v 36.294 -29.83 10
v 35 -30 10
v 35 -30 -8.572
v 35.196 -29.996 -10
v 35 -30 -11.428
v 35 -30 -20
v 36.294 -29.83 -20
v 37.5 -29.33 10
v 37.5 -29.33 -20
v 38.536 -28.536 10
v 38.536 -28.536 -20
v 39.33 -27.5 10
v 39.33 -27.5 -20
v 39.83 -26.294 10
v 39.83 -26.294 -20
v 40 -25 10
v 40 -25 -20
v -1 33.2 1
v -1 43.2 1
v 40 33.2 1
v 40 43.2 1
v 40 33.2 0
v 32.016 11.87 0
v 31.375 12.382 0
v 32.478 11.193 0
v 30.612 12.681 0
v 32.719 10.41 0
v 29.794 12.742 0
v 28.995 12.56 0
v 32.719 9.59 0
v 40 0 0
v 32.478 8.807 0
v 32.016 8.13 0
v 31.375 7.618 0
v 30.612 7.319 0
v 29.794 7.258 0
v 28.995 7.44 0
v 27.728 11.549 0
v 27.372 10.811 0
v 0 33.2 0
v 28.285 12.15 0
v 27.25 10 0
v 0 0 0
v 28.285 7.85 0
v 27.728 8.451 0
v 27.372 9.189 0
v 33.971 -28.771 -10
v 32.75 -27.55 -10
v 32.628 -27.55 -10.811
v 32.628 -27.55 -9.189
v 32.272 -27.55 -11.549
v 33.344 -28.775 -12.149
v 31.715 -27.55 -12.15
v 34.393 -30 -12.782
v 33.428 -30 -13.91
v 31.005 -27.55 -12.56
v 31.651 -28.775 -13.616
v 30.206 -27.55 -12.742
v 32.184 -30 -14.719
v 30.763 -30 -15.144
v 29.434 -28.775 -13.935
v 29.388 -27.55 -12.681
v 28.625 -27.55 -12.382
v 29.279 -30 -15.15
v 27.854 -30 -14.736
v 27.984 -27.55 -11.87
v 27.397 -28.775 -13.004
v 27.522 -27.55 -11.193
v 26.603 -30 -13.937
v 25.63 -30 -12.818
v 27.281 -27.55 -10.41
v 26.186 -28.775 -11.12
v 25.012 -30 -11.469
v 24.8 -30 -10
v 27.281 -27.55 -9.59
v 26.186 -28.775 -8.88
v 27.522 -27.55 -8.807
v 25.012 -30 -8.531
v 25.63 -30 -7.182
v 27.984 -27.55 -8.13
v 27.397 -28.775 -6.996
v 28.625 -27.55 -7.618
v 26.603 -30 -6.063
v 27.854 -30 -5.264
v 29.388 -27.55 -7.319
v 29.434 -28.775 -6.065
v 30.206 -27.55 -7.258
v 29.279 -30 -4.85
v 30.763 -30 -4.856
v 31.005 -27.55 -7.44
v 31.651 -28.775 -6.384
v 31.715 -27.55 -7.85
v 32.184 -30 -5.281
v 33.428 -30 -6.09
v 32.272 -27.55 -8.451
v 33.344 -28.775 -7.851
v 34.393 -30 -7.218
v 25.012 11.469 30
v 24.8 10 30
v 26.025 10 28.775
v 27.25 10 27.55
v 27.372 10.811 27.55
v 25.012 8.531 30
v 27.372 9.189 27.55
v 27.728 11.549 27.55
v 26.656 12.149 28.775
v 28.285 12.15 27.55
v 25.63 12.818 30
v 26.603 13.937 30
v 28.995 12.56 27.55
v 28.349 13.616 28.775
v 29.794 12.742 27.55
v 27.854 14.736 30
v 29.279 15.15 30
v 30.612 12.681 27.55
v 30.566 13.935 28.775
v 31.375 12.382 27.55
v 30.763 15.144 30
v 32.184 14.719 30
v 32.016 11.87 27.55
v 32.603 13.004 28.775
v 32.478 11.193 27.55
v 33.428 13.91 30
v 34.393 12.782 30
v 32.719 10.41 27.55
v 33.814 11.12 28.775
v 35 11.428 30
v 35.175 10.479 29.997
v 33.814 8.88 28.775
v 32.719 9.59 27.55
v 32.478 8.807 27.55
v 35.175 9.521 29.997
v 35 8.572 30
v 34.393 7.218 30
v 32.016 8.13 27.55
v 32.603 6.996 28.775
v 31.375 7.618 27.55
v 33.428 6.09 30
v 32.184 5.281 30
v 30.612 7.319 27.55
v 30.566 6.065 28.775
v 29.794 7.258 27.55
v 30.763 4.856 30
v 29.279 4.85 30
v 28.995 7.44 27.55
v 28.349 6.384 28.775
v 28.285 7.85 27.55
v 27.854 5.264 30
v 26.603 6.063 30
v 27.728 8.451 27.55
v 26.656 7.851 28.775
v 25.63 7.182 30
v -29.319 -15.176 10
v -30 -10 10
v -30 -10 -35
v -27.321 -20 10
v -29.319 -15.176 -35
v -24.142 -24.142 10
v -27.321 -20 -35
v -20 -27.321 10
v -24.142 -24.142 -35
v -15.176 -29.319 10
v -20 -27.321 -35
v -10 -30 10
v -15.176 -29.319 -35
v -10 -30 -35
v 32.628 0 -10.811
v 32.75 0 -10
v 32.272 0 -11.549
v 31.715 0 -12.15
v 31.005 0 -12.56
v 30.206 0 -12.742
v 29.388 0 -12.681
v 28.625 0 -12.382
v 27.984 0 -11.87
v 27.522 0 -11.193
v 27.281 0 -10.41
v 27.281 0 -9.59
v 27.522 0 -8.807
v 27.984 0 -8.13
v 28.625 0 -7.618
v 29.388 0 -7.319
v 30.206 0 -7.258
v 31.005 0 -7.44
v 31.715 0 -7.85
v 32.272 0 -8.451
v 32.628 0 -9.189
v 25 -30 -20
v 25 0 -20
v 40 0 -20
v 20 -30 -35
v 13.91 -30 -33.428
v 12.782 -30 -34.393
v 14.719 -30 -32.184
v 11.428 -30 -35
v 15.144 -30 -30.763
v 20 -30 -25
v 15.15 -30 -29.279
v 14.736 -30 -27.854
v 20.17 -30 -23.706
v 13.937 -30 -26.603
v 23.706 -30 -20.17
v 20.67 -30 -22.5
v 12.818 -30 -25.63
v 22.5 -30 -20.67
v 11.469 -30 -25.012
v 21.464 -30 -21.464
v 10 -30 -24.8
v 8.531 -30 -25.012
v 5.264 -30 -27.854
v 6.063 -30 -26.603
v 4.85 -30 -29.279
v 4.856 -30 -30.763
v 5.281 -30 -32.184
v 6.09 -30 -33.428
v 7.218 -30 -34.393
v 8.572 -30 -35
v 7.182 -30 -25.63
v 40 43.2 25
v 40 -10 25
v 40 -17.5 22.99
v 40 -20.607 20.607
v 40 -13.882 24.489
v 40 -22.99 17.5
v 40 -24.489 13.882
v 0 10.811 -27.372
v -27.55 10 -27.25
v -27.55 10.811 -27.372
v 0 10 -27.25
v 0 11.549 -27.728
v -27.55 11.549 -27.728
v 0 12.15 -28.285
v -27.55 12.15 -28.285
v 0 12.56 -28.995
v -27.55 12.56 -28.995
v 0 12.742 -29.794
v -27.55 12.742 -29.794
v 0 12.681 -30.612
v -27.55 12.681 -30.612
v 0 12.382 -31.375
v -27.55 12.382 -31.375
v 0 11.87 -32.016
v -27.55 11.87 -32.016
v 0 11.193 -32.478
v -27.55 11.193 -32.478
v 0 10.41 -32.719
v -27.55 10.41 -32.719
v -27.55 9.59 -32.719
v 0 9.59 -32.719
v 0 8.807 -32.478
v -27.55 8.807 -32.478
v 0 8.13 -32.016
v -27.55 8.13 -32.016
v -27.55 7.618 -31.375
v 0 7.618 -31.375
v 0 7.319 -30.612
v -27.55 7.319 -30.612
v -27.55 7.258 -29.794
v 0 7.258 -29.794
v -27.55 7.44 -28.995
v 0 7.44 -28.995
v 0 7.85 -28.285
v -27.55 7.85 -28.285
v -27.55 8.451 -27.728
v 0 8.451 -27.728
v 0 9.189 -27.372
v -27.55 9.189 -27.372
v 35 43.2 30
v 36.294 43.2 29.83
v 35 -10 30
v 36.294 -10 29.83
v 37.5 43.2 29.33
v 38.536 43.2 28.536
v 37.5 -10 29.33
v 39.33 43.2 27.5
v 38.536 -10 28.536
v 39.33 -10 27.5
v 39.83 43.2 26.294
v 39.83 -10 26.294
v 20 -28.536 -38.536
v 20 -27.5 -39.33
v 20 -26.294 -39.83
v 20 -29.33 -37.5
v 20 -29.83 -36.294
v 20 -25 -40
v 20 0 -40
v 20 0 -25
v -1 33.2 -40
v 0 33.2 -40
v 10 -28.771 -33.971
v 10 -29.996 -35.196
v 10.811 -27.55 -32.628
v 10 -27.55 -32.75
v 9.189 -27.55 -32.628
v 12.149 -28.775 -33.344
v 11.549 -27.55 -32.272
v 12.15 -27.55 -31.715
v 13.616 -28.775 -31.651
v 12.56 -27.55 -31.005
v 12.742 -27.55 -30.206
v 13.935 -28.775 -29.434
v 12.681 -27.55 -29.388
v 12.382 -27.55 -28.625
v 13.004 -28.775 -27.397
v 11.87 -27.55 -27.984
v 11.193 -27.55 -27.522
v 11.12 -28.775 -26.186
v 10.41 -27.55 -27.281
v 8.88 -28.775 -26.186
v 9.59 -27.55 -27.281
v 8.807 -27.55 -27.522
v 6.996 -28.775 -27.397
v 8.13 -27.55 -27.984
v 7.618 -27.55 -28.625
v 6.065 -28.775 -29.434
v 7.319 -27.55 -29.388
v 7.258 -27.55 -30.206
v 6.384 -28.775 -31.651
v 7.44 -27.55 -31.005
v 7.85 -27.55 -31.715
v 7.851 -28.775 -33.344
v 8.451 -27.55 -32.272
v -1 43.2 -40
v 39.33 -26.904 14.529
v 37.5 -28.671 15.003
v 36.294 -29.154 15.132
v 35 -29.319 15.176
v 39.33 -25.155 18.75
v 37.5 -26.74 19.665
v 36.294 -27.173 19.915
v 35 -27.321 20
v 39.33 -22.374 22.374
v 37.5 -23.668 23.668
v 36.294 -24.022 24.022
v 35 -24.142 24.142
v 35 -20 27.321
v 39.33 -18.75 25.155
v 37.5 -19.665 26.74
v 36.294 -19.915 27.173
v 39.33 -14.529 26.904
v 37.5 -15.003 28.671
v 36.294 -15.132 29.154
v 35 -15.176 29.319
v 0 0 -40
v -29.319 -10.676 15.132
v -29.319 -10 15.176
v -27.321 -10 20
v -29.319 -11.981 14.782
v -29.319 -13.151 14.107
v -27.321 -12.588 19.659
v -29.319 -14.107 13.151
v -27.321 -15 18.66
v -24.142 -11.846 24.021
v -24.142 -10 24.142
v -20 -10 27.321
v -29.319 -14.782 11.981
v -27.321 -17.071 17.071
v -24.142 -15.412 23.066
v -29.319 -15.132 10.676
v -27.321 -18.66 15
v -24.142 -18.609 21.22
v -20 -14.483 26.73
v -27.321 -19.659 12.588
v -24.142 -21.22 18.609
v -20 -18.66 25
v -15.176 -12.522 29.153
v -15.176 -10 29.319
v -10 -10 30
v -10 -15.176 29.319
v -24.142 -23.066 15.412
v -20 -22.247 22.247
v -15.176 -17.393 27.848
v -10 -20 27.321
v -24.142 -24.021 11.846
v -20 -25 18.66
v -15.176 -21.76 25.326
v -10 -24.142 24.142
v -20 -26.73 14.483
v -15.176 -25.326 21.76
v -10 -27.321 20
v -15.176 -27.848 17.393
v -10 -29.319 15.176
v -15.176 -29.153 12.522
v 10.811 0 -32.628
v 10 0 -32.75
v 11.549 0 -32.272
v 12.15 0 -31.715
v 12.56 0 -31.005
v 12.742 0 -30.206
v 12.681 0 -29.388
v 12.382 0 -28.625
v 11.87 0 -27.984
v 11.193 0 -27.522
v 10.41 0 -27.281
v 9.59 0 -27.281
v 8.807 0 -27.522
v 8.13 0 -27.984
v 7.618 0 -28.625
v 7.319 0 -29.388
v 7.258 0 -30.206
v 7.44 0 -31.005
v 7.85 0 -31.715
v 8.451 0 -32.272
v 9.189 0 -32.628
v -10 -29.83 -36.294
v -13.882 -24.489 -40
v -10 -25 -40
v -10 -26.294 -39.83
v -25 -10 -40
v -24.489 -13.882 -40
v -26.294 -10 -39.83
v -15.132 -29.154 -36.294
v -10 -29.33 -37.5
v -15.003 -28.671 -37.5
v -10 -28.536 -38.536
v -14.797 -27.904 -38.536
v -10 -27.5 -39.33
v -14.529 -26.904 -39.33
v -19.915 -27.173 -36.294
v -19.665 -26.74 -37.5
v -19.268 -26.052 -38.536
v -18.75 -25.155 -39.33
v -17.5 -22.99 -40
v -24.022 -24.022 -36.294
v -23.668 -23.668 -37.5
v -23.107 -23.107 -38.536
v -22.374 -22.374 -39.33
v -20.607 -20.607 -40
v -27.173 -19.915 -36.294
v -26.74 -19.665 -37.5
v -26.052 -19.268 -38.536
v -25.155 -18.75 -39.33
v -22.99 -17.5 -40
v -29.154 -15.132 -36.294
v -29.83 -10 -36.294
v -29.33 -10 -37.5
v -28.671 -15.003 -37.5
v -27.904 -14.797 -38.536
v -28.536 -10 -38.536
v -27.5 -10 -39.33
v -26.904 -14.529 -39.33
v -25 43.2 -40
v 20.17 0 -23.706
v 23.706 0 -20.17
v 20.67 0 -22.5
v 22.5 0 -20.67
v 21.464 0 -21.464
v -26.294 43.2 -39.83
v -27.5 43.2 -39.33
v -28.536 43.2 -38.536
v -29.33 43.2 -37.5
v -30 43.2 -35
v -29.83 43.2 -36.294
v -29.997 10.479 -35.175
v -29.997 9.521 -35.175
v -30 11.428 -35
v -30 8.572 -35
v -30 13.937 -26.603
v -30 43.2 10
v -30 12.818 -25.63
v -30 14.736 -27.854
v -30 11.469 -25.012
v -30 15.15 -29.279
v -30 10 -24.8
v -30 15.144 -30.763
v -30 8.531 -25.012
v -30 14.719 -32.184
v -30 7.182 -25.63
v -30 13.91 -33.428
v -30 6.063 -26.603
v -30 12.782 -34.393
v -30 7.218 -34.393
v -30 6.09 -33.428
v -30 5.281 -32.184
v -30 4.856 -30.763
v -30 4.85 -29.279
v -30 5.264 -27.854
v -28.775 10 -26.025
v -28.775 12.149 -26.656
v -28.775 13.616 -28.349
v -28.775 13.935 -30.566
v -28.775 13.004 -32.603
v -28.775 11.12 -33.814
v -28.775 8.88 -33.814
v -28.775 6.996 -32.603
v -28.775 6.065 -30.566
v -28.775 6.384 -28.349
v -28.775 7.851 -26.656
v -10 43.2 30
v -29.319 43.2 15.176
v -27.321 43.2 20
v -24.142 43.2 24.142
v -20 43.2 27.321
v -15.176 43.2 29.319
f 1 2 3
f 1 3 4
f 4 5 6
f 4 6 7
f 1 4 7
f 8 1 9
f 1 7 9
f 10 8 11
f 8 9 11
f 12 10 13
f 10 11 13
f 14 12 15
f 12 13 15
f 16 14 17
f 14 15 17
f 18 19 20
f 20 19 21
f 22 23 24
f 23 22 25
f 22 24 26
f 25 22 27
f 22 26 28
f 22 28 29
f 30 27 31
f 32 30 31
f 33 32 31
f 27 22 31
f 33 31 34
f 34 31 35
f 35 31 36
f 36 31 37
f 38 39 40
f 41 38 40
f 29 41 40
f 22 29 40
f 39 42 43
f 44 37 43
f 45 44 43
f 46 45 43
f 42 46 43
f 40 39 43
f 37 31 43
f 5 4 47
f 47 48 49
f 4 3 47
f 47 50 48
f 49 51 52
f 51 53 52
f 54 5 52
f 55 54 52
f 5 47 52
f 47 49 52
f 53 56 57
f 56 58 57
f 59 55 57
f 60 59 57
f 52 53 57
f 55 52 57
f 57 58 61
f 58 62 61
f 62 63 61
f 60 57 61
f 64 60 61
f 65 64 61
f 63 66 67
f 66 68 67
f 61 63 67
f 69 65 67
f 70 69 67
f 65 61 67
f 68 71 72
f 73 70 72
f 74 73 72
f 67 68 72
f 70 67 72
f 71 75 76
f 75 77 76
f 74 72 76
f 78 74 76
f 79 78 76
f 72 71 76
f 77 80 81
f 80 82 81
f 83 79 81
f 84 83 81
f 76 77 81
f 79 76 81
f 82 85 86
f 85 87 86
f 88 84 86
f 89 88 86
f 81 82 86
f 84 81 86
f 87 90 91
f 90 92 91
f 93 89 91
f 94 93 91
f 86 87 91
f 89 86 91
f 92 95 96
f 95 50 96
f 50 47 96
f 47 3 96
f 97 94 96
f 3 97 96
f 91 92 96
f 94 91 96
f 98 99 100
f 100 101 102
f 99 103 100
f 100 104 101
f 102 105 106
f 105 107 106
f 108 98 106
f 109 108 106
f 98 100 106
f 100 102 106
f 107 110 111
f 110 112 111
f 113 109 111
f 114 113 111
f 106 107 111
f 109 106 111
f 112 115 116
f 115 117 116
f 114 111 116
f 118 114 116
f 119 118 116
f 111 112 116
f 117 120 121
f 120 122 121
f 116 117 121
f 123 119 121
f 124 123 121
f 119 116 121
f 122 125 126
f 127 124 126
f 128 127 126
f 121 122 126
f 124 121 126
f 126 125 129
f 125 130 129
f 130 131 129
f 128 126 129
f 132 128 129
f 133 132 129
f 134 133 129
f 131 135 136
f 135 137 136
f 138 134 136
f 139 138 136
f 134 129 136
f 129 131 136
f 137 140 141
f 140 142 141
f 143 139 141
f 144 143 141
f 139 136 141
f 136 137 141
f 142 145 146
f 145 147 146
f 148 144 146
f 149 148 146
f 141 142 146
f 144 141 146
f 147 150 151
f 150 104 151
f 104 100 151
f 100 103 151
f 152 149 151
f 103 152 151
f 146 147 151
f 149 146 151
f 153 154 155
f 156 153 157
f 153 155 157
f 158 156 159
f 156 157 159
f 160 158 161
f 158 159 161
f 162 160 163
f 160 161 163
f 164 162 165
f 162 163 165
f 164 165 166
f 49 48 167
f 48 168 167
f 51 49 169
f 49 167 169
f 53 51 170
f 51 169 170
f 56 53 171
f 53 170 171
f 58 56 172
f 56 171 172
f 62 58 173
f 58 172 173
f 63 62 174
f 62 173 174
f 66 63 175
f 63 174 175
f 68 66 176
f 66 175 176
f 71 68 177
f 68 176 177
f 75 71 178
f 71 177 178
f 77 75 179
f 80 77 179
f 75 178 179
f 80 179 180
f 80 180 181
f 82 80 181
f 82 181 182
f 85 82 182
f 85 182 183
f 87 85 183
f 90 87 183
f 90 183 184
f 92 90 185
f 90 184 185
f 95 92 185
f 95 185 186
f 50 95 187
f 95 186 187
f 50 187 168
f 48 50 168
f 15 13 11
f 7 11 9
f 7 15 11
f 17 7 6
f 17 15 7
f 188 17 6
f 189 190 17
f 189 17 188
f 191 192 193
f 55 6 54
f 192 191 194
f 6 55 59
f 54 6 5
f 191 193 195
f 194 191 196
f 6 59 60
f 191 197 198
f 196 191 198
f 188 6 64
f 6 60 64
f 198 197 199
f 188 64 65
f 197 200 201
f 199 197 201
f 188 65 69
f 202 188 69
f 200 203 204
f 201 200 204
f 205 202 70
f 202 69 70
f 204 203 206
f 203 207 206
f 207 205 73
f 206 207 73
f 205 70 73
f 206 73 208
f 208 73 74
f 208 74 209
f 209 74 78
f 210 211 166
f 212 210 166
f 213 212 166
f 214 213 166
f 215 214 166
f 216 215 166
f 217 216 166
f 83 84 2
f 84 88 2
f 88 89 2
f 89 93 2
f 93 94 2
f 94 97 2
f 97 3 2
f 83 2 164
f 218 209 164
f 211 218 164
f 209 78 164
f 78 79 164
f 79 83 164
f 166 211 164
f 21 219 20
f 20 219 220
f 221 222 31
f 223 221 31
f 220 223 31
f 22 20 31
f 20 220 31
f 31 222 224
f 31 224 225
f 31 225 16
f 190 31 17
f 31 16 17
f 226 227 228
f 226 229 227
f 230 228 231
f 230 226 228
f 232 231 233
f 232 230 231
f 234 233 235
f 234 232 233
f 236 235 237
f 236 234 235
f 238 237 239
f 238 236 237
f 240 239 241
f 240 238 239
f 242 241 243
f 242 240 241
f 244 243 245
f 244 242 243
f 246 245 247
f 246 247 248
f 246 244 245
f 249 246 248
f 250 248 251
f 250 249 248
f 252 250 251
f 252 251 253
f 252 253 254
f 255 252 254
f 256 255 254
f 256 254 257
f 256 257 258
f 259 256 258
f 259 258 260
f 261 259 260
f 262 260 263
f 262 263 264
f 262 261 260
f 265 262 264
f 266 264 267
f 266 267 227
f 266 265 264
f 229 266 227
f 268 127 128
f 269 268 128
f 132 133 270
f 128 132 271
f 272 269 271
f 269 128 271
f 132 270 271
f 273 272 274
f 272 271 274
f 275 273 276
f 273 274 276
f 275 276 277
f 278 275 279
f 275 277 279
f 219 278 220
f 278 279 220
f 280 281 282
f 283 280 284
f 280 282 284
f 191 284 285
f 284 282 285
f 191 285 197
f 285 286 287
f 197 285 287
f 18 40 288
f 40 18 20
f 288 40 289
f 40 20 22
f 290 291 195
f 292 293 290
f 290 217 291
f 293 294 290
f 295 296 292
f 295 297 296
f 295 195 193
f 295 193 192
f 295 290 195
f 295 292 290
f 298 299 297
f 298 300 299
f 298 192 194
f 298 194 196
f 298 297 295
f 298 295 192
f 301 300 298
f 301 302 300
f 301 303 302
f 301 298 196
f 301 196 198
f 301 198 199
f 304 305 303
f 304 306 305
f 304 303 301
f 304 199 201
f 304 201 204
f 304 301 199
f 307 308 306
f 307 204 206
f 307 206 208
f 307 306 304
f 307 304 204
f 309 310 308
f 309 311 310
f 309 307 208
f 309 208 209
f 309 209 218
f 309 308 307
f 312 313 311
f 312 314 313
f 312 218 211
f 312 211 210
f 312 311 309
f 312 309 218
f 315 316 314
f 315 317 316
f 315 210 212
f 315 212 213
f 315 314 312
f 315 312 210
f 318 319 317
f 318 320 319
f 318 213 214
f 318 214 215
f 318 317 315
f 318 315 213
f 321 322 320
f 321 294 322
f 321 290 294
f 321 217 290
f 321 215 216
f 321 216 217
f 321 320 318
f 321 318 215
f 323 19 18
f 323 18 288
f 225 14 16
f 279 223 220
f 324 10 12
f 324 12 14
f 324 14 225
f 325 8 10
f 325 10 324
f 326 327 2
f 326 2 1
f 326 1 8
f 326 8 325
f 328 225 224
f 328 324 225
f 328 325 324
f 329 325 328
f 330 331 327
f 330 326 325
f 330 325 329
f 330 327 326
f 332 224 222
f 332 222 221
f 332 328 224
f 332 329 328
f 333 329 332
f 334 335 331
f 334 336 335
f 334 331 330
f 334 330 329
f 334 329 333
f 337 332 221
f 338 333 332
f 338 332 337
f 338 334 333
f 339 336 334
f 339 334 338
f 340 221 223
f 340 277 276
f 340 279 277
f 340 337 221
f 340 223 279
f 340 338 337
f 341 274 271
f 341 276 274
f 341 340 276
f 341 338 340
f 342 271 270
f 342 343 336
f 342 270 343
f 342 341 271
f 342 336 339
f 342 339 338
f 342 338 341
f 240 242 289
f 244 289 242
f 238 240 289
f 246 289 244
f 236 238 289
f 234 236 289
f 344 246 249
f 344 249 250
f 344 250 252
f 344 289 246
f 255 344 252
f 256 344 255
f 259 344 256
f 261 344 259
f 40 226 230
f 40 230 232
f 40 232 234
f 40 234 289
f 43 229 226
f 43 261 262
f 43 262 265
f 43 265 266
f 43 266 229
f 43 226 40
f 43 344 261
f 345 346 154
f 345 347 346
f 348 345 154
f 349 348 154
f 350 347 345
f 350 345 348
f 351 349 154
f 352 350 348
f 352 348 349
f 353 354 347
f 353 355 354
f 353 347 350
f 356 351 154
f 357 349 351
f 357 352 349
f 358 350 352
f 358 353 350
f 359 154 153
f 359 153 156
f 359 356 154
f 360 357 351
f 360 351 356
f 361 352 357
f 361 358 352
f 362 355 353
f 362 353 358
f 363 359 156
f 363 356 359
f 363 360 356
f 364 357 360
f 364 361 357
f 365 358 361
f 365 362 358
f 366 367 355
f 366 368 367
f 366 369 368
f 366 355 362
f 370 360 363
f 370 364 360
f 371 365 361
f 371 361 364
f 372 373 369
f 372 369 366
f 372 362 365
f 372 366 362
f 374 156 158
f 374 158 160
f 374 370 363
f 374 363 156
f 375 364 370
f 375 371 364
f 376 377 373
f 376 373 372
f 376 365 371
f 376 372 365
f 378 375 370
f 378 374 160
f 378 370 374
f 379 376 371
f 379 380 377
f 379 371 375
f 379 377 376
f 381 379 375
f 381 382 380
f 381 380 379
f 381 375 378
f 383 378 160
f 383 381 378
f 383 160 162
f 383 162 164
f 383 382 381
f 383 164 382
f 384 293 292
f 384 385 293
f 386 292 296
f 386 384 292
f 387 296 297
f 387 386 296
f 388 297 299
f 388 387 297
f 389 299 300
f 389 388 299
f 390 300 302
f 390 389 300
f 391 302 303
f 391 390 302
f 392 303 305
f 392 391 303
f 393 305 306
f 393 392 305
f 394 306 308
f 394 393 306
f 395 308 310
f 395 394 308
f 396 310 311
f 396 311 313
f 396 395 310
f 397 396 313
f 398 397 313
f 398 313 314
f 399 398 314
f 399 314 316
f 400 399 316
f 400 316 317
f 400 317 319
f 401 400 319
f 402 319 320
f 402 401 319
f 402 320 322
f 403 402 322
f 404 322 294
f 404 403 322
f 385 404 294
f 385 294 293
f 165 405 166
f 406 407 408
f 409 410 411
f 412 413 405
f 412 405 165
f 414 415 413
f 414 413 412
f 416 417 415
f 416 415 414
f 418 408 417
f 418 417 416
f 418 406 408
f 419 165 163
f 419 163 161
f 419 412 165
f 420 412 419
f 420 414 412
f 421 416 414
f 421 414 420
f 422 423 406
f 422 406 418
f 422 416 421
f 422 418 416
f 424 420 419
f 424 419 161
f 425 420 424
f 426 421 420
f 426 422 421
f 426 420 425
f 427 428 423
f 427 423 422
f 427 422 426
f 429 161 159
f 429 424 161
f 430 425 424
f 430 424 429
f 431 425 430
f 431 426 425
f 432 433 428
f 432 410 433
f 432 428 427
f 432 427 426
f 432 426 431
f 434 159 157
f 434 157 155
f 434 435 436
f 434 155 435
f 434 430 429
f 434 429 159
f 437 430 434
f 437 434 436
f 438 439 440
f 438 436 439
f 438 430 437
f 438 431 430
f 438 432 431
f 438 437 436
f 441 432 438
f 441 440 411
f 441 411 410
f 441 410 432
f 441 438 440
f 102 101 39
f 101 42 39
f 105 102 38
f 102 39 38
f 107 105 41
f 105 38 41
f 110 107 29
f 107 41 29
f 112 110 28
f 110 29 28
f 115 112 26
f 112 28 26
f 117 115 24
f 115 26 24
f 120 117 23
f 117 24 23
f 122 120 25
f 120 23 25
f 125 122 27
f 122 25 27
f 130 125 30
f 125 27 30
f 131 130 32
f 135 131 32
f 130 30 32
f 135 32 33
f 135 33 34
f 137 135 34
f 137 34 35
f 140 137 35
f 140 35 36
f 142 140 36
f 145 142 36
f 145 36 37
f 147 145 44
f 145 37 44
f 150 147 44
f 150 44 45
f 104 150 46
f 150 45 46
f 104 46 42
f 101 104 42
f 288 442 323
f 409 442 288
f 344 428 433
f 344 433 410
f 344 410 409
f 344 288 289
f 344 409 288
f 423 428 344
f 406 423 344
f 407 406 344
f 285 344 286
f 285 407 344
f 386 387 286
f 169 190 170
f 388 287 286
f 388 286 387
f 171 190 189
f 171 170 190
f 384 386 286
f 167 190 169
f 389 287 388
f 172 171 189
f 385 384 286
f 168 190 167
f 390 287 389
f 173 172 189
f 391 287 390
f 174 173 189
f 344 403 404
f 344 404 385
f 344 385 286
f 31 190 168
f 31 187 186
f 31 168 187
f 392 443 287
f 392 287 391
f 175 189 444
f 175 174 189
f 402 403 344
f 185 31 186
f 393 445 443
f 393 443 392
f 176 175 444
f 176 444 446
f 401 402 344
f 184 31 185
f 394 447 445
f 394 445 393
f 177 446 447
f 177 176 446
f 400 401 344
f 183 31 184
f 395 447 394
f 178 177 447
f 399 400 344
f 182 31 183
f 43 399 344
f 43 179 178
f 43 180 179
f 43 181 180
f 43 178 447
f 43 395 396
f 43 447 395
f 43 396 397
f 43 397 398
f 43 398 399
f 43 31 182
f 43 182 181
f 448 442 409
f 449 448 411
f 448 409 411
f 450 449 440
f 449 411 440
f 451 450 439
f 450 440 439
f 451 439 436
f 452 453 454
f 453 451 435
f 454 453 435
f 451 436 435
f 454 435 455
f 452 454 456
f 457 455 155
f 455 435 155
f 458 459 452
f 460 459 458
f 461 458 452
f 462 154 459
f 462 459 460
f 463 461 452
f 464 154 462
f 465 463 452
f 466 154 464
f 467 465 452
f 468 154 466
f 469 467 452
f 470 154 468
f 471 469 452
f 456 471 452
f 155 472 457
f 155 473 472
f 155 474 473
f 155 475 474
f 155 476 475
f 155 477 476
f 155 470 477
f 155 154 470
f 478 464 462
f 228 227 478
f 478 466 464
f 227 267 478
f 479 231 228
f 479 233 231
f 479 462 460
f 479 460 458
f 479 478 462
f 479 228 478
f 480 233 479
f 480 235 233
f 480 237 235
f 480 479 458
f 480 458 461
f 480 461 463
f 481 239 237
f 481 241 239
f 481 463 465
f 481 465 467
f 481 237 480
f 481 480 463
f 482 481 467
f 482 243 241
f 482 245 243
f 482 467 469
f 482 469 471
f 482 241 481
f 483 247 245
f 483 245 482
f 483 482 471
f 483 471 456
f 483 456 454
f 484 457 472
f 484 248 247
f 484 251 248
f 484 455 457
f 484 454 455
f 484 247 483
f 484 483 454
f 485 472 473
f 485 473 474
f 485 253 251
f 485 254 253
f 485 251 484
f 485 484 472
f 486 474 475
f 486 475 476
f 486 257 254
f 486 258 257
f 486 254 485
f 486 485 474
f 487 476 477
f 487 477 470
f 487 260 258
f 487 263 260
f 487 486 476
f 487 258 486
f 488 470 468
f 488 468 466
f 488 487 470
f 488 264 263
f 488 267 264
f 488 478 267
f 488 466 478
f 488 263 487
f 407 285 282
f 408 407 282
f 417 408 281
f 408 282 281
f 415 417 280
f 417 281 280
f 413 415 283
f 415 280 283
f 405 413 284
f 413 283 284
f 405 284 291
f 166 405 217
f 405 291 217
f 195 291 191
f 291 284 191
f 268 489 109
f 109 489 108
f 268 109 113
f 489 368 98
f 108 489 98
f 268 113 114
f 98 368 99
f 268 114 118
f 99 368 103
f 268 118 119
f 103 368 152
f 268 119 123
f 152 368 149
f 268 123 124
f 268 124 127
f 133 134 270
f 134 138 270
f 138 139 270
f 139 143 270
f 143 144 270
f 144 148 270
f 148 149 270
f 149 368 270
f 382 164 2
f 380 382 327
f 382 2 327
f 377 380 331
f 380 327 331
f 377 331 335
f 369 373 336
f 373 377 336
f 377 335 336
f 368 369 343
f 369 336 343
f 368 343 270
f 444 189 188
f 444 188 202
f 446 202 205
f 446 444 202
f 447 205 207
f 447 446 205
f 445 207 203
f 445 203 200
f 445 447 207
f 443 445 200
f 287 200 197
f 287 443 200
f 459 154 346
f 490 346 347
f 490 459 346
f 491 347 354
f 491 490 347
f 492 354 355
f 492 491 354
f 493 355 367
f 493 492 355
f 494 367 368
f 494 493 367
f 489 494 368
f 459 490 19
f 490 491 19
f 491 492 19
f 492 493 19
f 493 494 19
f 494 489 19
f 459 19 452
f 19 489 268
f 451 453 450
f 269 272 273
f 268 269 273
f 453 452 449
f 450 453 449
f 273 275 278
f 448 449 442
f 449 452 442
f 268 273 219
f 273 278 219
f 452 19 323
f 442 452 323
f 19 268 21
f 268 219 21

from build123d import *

# Parameters (mm, degrees)
BOSS_EXTRUDE1_DEPTH                             = 30
BOSS_EXTRUDE2_DEPTH                             = 43.2
CSK_FOR_M5_FLAT_HEAD_MACHINE_SCREW1_D           = 5.5
CSK_FOR_M5_FLAT_HEAD_MACHINE_SCREW1_CSINK_D     = 10.4
CSK_FOR_M5_FLAT_HEAD_MACHINE_SCREW1_CSINK_ANGLE = 90
CSK_FOR_M5_FLAT_HEAD_MACHINE_SCREW2_D           = 5.5
CSK_FOR_M5_FLAT_HEAD_MACHINE_SCREW2_CSINK_D     = 10.4
CSK_FOR_M5_FLAT_HEAD_MACHINE_SCREW2_CSINK_ANGLE = 90
CUT_EXTRUDE1_DEPTH                              = 10
FILLET3_R                                       = 20
FILLET4_R                                       = 5


with BuildPart() as part:
    # Sketch1 → Boss-Extrude1 (new body)
    with BuildSketch(Plane(origin=(0, 0, 0), x_dir=(1, 0, 0), z_dir=(0, 1, 0))):
        Polygon((20, 20), (0, 0), (40, 0), (40, 20), align=None)
        Polygon((40, 0), (0, 0), (-30, -30), (40, -30), align=None)
    extrude(amount=-BOSS_EXTRUDE1_DEPTH)

    # Sketch1<3> → Boss-Extrude2 (add)
    with BuildSketch(Plane(origin=(0, 0, 0), x_dir=(1, 0, 0), z_dir=(0, 1, 0))):
        Polygon((40, 0), (0, 0), (-30, -30), (40, -30), align=None)
    extrude(amount=BOSS_EXTRUDE2_DEPTH)

    # CSK for M5 Flat Head Machine Screw1 (through all)
    with Locations(Plane.XY.offset(30)):
        with Locations((30, 10)):
            CounterSinkHole(CSK_FOR_M5_FLAT_HEAD_MACHINE_SCREW1_D / 2, CSK_FOR_M5_FLAT_HEAD_MACHINE_SCREW1_CSINK_D / 2, counter_sink_angle=CSK_FOR_M5_FLAT_HEAD_MACHINE_SCREW1_CSINK_ANGLE)

    # CSK for M5 Flat Head Machine Screw2 (through all)
    with Locations(Plane(origin=(0, -30, 0), x_dir=(-1, 0, 0), z_dir=(0, -1, 0))):
        with Locations((-30, 10)):
            CounterSinkHole(CSK_FOR_M5_FLAT_HEAD_MACHINE_SCREW2_D / 2, CSK_FOR_M5_FLAT_HEAD_MACHINE_SCREW2_CSINK_D / 2, counter_sink_angle=CSK_FOR_M5_FLAT_HEAD_MACHINE_SCREW2_CSINK_ANGLE)

    # Sketch10 → Cut-Extrude1 (cut)
    with BuildSketch(Plane(origin=(0, 43.2, 0), x_dir=(1, 0, 0), z_dir=(0, 1, 0))):
        Polygon((0, 0), (-1, -1), (40, -1), (40, 0), align=None)
    extrude(amount=-CUT_EXTRUDE1_DEPTH, mode=Mode.SUBTRACT)

    # Mirror2: part across plane


with BuildPart() as part_1:
    add(part.part)
    add(part.part.mirror(Plane(origin=(0, -30, 0), x_dir=(-0.7071067811865513, 0, 0.7071067811865438), z_dir=(-0.7071067811865439, 0, -0.7071067811865512))))

    # Fillet3
    fillet3_edges = [part_1.edges().sort_by_distance(p)[0] for p in [
        (5, -30, 30),
        (-30, 6.6, 30),
        (-30, -30, -5),
    ]]
    fillet(fillet3_edges, radius=FILLET3_R)

    # Fillet4
    # the kernel refuses this fillet: 5 mm, written as the material it adds along each edge
    with BuildSketch(Plane(origin=(20, 0, -20), x_dir=(1, 0, 0), z_dir=(0, -1, 0))) as fillet4_piece_1:
        with BuildLine():
            CenterArc((FILLET4_R, -FILLET4_R), FILLET4_R, 90, 90)
            Line((0, -FILLET4_R), (0, 0))
            Line((0, 0), (FILLET4_R, 0))
        make_face()
    extrude(amount=30)
    # the kernel refuses this fillet: 5 mm, written as the material it takes off along each edge
    with BuildSketch(Plane(origin=(40, -10, 30), x_dir=(0, 0, -1), z_dir=(0, 1, 0))) as fillet4_2_piece_1:
        with BuildLine():
            CenterArc((FILLET4_R, FILLET4_R), FILLET4_R, 180, 90)
            Line((0, FILLET4_R), (0, 0))
            Line((0, 0), (FILLET4_R, 0))
        make_face()
    extrude(amount=65.7, mode=Mode.SUBTRACT)
    with BuildSketch(Plane(origin=(40, -30, -32.5), x_dir=(0, 1, 0), z_dir=(0, 0, 1)), Plane(origin=(32.5, -30, -40), x_dir=(0, 0, 1), z_dir=(-1, 0, 0))) as fillet4_2_piece_2:
        with BuildLine():
            CenterArc((FILLET4_R, FILLET4_R), FILLET4_R, 180, 90)
            Line((0, FILLET4_R), (0, 0))
            Line((0, 0), (FILLET4_R, 0))
        make_face()
    extrude(amount=42.5, mode=Mode.SUBTRACT)
    with BuildSketch(Plane(origin=(40, -10, 10), x_dir=(0, -1, 0), z_dir=(0, 0, -1))) as fillet4_2_piece_3:
        with BuildLine():
            CenterArc((20 - FILLET4_R, FILLET4_R), FILLET4_R, 270, 90)
            Line((20, FILLET4_R), (20, 0))
            Line((20, 0), (20 - FILLET4_R, 0))
        make_face()
    revolve(axis=Axis((40, -10, 10), (-1, 0, 0)), revolution_arc=90, mode=Mode.SUBTRACT)
    with BuildSketch(Plane(origin=(-30, -10, -40), x_dir=(1, 0, 0), z_dir=(0, 1, 0))) as fillet4_2_piece_4:
        with BuildLine():
            CenterArc((FILLET4_R, -FILLET4_R), FILLET4_R, 90, 90)
            Line((0, -FILLET4_R), (0, 0))
            Line((0, 0), (FILLET4_R, 0))
        make_face()
    extrude(amount=65.7, mode=Mode.SUBTRACT)
    with BuildSketch(Plane(origin=(-10, -10, -40), x_dir=(0, -1, 0), z_dir=(1, 0, 0))) as fillet4_2_piece_5:
        with BuildLine():
            CenterArc((20 - FILLET4_R, -FILLET4_R), FILLET4_R, 0, 90)
            Line((20 - FILLET4_R, 0), (20, 0))
            Line((20, 0), (20, -FILLET4_R))
        make_face()
    revolve(axis=Axis((-10, -10, -40), (0, 0, -1)), revolution_arc=90, mode=Mode.SUBTRACT)


solid = part_1.part
